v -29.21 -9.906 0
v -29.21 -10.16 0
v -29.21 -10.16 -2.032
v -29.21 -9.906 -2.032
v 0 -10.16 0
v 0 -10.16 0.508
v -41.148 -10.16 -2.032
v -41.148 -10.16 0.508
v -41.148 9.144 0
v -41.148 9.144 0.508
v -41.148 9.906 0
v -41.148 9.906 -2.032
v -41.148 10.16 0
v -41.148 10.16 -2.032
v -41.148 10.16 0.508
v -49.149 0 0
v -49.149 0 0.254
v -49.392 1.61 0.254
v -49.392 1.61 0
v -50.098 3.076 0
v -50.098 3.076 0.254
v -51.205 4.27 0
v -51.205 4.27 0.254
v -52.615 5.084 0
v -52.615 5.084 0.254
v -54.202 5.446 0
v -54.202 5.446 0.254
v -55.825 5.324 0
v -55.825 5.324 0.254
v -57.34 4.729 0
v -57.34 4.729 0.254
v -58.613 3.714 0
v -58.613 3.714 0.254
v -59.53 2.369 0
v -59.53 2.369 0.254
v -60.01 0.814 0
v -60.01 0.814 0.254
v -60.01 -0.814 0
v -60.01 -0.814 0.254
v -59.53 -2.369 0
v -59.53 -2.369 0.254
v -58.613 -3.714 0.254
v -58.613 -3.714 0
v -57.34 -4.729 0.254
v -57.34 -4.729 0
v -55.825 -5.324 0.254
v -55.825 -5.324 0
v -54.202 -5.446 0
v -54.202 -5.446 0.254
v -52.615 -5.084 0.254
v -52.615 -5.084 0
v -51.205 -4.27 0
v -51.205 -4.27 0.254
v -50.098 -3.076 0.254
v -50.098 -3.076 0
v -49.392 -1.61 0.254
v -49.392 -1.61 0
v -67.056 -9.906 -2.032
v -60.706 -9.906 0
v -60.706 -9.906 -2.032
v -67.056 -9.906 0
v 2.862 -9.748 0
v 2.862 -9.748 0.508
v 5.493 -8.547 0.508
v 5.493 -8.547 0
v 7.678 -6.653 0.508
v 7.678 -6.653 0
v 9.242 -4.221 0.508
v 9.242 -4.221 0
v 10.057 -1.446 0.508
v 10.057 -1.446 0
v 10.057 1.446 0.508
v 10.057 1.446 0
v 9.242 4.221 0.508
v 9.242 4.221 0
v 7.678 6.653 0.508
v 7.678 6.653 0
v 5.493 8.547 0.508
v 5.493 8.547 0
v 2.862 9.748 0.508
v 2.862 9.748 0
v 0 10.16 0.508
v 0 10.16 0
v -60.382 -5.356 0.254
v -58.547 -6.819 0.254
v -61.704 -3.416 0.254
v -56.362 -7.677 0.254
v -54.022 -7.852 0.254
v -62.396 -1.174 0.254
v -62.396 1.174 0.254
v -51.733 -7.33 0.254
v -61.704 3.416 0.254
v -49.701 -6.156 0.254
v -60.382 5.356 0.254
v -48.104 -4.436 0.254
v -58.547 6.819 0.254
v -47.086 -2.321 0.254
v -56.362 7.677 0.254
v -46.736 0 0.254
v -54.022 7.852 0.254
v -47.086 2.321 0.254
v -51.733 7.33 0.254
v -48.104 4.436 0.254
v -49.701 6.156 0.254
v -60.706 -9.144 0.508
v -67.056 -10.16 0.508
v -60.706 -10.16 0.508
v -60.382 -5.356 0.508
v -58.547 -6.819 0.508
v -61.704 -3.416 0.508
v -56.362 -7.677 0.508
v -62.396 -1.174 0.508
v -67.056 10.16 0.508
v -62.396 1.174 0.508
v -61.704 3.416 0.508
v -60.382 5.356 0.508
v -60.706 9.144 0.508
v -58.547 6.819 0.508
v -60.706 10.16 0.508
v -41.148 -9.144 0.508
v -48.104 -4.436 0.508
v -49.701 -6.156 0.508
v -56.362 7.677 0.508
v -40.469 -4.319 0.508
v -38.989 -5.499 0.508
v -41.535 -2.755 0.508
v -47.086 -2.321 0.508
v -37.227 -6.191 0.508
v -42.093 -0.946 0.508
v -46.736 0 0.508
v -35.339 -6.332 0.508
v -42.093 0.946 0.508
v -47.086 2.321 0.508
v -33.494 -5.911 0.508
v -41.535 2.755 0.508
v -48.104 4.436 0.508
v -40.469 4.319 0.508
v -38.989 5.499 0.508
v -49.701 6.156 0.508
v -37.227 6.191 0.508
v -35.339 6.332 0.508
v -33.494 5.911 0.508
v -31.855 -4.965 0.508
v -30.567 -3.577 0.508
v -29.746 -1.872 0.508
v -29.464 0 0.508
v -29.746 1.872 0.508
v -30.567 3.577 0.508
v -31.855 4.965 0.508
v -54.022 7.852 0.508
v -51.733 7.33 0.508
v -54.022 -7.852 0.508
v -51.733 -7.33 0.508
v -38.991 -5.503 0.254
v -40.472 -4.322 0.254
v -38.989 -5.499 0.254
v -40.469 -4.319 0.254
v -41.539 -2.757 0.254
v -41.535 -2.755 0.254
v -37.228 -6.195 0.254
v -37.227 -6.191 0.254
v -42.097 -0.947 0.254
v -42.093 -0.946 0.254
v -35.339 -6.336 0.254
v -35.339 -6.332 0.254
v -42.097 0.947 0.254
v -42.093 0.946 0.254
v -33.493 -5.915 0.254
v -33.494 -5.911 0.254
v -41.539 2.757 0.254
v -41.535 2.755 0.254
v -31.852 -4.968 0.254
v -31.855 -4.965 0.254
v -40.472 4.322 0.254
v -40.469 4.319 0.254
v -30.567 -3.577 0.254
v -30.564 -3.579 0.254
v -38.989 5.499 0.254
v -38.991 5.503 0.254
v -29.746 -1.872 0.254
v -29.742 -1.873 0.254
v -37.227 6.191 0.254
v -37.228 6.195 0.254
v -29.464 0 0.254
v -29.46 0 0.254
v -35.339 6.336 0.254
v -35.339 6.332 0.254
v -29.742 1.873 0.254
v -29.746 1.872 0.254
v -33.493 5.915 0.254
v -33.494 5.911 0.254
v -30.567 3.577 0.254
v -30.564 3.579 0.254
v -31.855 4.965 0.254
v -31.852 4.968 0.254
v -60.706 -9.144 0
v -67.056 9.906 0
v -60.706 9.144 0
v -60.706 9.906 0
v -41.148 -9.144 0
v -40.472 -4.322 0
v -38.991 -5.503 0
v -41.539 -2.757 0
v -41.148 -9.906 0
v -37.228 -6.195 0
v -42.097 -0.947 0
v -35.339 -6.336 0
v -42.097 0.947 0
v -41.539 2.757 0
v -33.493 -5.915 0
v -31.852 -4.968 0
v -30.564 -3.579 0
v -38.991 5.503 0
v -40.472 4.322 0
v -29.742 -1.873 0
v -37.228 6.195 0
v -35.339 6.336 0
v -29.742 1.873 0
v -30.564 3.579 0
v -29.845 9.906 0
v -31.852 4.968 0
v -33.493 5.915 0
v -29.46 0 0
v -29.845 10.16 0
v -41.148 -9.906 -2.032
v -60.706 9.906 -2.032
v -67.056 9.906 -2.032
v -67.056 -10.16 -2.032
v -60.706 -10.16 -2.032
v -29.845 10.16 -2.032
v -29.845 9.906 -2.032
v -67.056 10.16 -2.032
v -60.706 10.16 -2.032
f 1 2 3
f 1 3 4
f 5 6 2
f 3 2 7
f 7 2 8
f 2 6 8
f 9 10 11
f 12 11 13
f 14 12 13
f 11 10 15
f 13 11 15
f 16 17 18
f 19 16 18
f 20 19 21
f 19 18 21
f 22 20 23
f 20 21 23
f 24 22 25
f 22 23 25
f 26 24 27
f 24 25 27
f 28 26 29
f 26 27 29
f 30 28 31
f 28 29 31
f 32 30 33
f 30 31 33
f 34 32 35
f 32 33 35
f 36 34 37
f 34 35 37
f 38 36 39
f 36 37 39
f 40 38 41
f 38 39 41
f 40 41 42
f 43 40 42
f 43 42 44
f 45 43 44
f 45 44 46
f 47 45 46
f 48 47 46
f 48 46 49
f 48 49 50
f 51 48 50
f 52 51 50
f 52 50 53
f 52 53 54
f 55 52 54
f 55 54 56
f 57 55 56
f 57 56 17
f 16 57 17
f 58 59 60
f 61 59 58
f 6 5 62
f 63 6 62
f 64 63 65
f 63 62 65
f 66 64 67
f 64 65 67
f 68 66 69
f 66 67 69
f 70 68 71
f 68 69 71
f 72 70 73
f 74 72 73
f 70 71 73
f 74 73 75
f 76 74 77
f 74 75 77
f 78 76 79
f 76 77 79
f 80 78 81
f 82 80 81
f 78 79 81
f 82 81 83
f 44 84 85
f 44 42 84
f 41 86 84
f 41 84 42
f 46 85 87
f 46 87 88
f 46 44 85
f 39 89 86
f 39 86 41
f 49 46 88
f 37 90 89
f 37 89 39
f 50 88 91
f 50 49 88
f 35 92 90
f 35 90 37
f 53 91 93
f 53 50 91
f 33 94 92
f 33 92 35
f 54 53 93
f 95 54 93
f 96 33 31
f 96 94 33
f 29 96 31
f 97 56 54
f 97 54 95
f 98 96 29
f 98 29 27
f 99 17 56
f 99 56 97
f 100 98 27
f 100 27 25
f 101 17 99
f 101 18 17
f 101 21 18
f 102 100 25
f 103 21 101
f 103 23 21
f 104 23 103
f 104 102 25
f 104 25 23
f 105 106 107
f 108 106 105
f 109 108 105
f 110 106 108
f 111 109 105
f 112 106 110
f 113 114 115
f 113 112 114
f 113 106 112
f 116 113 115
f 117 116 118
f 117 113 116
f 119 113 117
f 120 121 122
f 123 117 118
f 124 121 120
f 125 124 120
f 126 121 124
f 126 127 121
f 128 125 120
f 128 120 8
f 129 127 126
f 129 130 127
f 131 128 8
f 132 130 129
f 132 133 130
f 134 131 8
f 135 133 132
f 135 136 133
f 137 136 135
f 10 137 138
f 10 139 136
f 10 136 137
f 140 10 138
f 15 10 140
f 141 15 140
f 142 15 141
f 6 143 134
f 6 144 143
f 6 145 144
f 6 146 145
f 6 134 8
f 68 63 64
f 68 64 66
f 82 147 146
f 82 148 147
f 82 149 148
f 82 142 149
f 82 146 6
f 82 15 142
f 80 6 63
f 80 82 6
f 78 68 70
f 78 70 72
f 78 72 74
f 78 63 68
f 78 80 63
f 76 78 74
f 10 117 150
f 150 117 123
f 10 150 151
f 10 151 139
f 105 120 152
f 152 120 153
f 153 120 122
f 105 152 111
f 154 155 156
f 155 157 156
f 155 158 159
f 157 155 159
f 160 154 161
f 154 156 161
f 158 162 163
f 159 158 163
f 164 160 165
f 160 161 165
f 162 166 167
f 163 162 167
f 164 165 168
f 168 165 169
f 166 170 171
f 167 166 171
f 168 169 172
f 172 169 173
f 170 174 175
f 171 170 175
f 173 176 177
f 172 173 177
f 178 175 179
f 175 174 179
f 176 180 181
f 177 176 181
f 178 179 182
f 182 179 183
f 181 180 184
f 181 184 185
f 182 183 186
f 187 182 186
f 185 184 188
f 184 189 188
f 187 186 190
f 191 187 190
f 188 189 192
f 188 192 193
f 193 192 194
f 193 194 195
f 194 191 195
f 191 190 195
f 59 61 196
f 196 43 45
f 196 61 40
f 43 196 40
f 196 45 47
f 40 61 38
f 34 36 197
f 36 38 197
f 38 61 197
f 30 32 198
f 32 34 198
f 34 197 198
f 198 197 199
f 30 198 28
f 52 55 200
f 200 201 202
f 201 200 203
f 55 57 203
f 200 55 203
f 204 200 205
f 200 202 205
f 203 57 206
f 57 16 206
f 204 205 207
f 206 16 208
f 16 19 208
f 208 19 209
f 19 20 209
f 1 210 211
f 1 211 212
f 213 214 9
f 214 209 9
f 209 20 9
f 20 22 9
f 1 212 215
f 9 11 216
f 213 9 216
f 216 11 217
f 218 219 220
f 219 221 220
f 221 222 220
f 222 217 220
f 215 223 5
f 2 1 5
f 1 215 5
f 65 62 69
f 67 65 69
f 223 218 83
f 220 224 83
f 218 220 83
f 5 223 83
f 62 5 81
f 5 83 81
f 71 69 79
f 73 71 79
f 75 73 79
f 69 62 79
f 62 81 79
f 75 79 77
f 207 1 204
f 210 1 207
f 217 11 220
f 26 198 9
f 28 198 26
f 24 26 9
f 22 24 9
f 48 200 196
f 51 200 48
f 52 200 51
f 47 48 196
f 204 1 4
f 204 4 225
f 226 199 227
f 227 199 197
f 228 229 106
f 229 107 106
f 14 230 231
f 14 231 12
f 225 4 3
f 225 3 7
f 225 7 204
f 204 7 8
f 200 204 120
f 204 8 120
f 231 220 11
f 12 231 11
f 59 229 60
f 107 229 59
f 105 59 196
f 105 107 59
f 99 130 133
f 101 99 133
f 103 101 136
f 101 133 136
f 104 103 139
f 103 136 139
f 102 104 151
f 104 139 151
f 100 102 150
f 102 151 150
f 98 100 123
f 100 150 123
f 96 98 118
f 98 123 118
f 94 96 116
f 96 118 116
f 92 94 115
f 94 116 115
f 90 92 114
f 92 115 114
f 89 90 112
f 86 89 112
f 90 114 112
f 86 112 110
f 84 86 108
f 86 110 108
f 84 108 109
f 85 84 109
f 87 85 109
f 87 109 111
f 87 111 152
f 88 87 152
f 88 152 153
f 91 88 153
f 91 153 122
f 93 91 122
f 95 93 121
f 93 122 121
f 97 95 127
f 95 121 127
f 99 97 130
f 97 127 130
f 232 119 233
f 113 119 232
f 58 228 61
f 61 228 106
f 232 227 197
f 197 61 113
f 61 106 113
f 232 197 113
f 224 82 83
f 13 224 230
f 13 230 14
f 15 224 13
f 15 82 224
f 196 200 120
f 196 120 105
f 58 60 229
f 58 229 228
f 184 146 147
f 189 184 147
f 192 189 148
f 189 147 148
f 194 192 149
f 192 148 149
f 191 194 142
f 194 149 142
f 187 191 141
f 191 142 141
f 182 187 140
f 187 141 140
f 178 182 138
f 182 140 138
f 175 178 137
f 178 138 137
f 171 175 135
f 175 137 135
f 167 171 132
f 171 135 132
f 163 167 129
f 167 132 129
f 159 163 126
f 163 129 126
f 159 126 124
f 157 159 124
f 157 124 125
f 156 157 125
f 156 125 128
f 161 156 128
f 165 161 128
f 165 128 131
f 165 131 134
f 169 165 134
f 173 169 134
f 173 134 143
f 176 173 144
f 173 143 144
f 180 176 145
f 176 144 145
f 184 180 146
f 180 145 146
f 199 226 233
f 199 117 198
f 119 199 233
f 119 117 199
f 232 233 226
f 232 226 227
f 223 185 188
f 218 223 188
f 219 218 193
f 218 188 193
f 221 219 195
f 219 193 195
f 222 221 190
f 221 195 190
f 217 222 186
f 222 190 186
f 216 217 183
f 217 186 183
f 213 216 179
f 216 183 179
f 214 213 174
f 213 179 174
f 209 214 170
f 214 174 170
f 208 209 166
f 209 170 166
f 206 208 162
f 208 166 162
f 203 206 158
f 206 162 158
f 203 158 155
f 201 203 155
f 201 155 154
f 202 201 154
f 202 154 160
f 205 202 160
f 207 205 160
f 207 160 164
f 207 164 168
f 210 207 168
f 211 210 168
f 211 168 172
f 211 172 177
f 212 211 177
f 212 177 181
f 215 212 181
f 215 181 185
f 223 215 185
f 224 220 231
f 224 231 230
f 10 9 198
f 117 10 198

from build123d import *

# Parameters (mm, degrees)
BOSS_EXTRUDE1_DEPTH = 0.508
SKETCH2_R           = 7.874
SKETCH2_R_2         = 6.35
CUT_EXTRUDE2_DEPTH  = 0.254
SKETCH5_R           = 6.354160617
CUT_EXTRUDE3_DEPTH  = 68.821805137
SKETCH6_R           = 5.461
CUT_EXTRUDE4_DEPTH  = 68.821805137
SKETCH7_W           = 19.558
SKETCH7_H           = 1.016
CUT_EXTRUDE5_DEPTH  = 68.823232008
SKETCH8_W           = 6.35
SKETCH8_H           = 0.254
BOSS_EXTRUDE2_DEPTH = 2.032
SKETCH10_W          = 11.303182767
SKETCH10_H          = 0.254
BOSS_EXTRUDE3_DEPTH = 2.032
SKETCH11_W          = 6.35
SKETCH11_H          = 0.254
BOSS_EXTRUDE4_DEPTH = 2.032
SKETCH12_W          = 11.938
SKETCH12_H          = 0.254
BOSS_EXTRUDE5_DEPTH = 2.032


with BuildPart() as part:
    # Sketch1 → Boss-Extrude1 (new body)
    with BuildSketch(Plane.XY):
        with BuildLine():
            ThreePointArc((0, -10.16), (10.16, 0), (0, 10.16))
            Line((0, 10.16), (-67.056, 10.16))
            Line((-67.056, 10.16), (-67.056, -10.16))
            Line((-67.056, -10.16), (0, -10.16))
        make_face()
    extrude(amount=BOSS_EXTRUDE1_DEPTH)

    # Sketch2 → Cut-Extrude2 (cut)
    with BuildSketch(Plane.XY.offset(0.508)):
        with Locations((-54.61, 0)):
            Circle(SKETCH2_R)
        with Locations((-35.814, 0)):
            Circle(SKETCH2_R_2)
    extrude(amount=-CUT_EXTRUDE2_DEPTH, mode=Mode.SUBTRACT)

    # Sketch5 → Cut-Extrude3 (cut, through all)
    with BuildSketch(Plane.XY.offset(0.254)):
        with Locations((-35.814, 0)):
            Circle(SKETCH5_R)
    extrude(amount=-CUT_EXTRUDE3_DEPTH, mode=Mode.SUBTRACT)

    # Sketch6 → Cut-Extrude4 (cut, through all)
    with BuildSketch(Plane.XY.offset(0.254)):
        with Locations((-54.61, 0)):
            Circle(SKETCH6_R)
    extrude(amount=-CUT_EXTRUDE4_DEPTH, mode=Mode.SUBTRACT)

    # Sketch7 → Cut-Extrude5 (cut, through all)
    with BuildSketch(Plane(origin=(0, 0, 0), x_dir=(-1, 0, 0), z_dir=(0, 0, -1))):
        with Locations((50.927, 9.652)):
            Rectangle(SKETCH7_W, SKETCH7_H)
        with Locations((50.927, -9.652)):
            Rectangle(SKETCH7_W, SKETCH7_H)
    extrude(amount=-CUT_EXTRUDE5_DEPTH, mode=Mode.SUBTRACT)

    # Sketch8 → Boss-Extrude2 (add)
    with BuildSketch(Plane(origin=(0, 0, 0), x_dir=(-1, 0, 0), z_dir=(0, 0, -1))):
        with Locations((63.881, 10.033)):
            Rectangle(SKETCH8_W, SKETCH8_H)
    extrude(amount=BOSS_EXTRUDE2_DEPTH)

    # Sketch10 → Boss-Extrude3 (add)
    with BuildSketch(Plane(origin=(0, 0, 0), x_dir=(-1, 0, 0), z_dir=(0, 0, -1))):
        with Locations((35.496408617, 10.033)):
            Rectangle(SKETCH10_W, SKETCH10_H)
    extrude(amount=BOSS_EXTRUDE3_DEPTH)

    # Sketch11 → Boss-Extrude4 (add)
    with BuildSketch(Plane(origin=(0, 0, 0), x_dir=(-1, 0, 0), z_dir=(0, 0, -1))):
        with Locations((63.881, -10.033)):
            Rectangle(SKETCH11_W, SKETCH11_H)
    extrude(amount=BOSS_EXTRUDE4_DEPTH)

    # Sketch12 → Boss-Extrude5 (add)
    with BuildSketch(Plane(origin=(0, 0, 0), x_dir=(-1, 0, 0), z_dir=(0, 0, -1))):
        with Locations((35.179, -10.033)):
            Rectangle(SKETCH12_W, SKETCH12_H)
    extrude(amount=BOSS_EXTRUDE5_DEPTH)


solid = part.part
